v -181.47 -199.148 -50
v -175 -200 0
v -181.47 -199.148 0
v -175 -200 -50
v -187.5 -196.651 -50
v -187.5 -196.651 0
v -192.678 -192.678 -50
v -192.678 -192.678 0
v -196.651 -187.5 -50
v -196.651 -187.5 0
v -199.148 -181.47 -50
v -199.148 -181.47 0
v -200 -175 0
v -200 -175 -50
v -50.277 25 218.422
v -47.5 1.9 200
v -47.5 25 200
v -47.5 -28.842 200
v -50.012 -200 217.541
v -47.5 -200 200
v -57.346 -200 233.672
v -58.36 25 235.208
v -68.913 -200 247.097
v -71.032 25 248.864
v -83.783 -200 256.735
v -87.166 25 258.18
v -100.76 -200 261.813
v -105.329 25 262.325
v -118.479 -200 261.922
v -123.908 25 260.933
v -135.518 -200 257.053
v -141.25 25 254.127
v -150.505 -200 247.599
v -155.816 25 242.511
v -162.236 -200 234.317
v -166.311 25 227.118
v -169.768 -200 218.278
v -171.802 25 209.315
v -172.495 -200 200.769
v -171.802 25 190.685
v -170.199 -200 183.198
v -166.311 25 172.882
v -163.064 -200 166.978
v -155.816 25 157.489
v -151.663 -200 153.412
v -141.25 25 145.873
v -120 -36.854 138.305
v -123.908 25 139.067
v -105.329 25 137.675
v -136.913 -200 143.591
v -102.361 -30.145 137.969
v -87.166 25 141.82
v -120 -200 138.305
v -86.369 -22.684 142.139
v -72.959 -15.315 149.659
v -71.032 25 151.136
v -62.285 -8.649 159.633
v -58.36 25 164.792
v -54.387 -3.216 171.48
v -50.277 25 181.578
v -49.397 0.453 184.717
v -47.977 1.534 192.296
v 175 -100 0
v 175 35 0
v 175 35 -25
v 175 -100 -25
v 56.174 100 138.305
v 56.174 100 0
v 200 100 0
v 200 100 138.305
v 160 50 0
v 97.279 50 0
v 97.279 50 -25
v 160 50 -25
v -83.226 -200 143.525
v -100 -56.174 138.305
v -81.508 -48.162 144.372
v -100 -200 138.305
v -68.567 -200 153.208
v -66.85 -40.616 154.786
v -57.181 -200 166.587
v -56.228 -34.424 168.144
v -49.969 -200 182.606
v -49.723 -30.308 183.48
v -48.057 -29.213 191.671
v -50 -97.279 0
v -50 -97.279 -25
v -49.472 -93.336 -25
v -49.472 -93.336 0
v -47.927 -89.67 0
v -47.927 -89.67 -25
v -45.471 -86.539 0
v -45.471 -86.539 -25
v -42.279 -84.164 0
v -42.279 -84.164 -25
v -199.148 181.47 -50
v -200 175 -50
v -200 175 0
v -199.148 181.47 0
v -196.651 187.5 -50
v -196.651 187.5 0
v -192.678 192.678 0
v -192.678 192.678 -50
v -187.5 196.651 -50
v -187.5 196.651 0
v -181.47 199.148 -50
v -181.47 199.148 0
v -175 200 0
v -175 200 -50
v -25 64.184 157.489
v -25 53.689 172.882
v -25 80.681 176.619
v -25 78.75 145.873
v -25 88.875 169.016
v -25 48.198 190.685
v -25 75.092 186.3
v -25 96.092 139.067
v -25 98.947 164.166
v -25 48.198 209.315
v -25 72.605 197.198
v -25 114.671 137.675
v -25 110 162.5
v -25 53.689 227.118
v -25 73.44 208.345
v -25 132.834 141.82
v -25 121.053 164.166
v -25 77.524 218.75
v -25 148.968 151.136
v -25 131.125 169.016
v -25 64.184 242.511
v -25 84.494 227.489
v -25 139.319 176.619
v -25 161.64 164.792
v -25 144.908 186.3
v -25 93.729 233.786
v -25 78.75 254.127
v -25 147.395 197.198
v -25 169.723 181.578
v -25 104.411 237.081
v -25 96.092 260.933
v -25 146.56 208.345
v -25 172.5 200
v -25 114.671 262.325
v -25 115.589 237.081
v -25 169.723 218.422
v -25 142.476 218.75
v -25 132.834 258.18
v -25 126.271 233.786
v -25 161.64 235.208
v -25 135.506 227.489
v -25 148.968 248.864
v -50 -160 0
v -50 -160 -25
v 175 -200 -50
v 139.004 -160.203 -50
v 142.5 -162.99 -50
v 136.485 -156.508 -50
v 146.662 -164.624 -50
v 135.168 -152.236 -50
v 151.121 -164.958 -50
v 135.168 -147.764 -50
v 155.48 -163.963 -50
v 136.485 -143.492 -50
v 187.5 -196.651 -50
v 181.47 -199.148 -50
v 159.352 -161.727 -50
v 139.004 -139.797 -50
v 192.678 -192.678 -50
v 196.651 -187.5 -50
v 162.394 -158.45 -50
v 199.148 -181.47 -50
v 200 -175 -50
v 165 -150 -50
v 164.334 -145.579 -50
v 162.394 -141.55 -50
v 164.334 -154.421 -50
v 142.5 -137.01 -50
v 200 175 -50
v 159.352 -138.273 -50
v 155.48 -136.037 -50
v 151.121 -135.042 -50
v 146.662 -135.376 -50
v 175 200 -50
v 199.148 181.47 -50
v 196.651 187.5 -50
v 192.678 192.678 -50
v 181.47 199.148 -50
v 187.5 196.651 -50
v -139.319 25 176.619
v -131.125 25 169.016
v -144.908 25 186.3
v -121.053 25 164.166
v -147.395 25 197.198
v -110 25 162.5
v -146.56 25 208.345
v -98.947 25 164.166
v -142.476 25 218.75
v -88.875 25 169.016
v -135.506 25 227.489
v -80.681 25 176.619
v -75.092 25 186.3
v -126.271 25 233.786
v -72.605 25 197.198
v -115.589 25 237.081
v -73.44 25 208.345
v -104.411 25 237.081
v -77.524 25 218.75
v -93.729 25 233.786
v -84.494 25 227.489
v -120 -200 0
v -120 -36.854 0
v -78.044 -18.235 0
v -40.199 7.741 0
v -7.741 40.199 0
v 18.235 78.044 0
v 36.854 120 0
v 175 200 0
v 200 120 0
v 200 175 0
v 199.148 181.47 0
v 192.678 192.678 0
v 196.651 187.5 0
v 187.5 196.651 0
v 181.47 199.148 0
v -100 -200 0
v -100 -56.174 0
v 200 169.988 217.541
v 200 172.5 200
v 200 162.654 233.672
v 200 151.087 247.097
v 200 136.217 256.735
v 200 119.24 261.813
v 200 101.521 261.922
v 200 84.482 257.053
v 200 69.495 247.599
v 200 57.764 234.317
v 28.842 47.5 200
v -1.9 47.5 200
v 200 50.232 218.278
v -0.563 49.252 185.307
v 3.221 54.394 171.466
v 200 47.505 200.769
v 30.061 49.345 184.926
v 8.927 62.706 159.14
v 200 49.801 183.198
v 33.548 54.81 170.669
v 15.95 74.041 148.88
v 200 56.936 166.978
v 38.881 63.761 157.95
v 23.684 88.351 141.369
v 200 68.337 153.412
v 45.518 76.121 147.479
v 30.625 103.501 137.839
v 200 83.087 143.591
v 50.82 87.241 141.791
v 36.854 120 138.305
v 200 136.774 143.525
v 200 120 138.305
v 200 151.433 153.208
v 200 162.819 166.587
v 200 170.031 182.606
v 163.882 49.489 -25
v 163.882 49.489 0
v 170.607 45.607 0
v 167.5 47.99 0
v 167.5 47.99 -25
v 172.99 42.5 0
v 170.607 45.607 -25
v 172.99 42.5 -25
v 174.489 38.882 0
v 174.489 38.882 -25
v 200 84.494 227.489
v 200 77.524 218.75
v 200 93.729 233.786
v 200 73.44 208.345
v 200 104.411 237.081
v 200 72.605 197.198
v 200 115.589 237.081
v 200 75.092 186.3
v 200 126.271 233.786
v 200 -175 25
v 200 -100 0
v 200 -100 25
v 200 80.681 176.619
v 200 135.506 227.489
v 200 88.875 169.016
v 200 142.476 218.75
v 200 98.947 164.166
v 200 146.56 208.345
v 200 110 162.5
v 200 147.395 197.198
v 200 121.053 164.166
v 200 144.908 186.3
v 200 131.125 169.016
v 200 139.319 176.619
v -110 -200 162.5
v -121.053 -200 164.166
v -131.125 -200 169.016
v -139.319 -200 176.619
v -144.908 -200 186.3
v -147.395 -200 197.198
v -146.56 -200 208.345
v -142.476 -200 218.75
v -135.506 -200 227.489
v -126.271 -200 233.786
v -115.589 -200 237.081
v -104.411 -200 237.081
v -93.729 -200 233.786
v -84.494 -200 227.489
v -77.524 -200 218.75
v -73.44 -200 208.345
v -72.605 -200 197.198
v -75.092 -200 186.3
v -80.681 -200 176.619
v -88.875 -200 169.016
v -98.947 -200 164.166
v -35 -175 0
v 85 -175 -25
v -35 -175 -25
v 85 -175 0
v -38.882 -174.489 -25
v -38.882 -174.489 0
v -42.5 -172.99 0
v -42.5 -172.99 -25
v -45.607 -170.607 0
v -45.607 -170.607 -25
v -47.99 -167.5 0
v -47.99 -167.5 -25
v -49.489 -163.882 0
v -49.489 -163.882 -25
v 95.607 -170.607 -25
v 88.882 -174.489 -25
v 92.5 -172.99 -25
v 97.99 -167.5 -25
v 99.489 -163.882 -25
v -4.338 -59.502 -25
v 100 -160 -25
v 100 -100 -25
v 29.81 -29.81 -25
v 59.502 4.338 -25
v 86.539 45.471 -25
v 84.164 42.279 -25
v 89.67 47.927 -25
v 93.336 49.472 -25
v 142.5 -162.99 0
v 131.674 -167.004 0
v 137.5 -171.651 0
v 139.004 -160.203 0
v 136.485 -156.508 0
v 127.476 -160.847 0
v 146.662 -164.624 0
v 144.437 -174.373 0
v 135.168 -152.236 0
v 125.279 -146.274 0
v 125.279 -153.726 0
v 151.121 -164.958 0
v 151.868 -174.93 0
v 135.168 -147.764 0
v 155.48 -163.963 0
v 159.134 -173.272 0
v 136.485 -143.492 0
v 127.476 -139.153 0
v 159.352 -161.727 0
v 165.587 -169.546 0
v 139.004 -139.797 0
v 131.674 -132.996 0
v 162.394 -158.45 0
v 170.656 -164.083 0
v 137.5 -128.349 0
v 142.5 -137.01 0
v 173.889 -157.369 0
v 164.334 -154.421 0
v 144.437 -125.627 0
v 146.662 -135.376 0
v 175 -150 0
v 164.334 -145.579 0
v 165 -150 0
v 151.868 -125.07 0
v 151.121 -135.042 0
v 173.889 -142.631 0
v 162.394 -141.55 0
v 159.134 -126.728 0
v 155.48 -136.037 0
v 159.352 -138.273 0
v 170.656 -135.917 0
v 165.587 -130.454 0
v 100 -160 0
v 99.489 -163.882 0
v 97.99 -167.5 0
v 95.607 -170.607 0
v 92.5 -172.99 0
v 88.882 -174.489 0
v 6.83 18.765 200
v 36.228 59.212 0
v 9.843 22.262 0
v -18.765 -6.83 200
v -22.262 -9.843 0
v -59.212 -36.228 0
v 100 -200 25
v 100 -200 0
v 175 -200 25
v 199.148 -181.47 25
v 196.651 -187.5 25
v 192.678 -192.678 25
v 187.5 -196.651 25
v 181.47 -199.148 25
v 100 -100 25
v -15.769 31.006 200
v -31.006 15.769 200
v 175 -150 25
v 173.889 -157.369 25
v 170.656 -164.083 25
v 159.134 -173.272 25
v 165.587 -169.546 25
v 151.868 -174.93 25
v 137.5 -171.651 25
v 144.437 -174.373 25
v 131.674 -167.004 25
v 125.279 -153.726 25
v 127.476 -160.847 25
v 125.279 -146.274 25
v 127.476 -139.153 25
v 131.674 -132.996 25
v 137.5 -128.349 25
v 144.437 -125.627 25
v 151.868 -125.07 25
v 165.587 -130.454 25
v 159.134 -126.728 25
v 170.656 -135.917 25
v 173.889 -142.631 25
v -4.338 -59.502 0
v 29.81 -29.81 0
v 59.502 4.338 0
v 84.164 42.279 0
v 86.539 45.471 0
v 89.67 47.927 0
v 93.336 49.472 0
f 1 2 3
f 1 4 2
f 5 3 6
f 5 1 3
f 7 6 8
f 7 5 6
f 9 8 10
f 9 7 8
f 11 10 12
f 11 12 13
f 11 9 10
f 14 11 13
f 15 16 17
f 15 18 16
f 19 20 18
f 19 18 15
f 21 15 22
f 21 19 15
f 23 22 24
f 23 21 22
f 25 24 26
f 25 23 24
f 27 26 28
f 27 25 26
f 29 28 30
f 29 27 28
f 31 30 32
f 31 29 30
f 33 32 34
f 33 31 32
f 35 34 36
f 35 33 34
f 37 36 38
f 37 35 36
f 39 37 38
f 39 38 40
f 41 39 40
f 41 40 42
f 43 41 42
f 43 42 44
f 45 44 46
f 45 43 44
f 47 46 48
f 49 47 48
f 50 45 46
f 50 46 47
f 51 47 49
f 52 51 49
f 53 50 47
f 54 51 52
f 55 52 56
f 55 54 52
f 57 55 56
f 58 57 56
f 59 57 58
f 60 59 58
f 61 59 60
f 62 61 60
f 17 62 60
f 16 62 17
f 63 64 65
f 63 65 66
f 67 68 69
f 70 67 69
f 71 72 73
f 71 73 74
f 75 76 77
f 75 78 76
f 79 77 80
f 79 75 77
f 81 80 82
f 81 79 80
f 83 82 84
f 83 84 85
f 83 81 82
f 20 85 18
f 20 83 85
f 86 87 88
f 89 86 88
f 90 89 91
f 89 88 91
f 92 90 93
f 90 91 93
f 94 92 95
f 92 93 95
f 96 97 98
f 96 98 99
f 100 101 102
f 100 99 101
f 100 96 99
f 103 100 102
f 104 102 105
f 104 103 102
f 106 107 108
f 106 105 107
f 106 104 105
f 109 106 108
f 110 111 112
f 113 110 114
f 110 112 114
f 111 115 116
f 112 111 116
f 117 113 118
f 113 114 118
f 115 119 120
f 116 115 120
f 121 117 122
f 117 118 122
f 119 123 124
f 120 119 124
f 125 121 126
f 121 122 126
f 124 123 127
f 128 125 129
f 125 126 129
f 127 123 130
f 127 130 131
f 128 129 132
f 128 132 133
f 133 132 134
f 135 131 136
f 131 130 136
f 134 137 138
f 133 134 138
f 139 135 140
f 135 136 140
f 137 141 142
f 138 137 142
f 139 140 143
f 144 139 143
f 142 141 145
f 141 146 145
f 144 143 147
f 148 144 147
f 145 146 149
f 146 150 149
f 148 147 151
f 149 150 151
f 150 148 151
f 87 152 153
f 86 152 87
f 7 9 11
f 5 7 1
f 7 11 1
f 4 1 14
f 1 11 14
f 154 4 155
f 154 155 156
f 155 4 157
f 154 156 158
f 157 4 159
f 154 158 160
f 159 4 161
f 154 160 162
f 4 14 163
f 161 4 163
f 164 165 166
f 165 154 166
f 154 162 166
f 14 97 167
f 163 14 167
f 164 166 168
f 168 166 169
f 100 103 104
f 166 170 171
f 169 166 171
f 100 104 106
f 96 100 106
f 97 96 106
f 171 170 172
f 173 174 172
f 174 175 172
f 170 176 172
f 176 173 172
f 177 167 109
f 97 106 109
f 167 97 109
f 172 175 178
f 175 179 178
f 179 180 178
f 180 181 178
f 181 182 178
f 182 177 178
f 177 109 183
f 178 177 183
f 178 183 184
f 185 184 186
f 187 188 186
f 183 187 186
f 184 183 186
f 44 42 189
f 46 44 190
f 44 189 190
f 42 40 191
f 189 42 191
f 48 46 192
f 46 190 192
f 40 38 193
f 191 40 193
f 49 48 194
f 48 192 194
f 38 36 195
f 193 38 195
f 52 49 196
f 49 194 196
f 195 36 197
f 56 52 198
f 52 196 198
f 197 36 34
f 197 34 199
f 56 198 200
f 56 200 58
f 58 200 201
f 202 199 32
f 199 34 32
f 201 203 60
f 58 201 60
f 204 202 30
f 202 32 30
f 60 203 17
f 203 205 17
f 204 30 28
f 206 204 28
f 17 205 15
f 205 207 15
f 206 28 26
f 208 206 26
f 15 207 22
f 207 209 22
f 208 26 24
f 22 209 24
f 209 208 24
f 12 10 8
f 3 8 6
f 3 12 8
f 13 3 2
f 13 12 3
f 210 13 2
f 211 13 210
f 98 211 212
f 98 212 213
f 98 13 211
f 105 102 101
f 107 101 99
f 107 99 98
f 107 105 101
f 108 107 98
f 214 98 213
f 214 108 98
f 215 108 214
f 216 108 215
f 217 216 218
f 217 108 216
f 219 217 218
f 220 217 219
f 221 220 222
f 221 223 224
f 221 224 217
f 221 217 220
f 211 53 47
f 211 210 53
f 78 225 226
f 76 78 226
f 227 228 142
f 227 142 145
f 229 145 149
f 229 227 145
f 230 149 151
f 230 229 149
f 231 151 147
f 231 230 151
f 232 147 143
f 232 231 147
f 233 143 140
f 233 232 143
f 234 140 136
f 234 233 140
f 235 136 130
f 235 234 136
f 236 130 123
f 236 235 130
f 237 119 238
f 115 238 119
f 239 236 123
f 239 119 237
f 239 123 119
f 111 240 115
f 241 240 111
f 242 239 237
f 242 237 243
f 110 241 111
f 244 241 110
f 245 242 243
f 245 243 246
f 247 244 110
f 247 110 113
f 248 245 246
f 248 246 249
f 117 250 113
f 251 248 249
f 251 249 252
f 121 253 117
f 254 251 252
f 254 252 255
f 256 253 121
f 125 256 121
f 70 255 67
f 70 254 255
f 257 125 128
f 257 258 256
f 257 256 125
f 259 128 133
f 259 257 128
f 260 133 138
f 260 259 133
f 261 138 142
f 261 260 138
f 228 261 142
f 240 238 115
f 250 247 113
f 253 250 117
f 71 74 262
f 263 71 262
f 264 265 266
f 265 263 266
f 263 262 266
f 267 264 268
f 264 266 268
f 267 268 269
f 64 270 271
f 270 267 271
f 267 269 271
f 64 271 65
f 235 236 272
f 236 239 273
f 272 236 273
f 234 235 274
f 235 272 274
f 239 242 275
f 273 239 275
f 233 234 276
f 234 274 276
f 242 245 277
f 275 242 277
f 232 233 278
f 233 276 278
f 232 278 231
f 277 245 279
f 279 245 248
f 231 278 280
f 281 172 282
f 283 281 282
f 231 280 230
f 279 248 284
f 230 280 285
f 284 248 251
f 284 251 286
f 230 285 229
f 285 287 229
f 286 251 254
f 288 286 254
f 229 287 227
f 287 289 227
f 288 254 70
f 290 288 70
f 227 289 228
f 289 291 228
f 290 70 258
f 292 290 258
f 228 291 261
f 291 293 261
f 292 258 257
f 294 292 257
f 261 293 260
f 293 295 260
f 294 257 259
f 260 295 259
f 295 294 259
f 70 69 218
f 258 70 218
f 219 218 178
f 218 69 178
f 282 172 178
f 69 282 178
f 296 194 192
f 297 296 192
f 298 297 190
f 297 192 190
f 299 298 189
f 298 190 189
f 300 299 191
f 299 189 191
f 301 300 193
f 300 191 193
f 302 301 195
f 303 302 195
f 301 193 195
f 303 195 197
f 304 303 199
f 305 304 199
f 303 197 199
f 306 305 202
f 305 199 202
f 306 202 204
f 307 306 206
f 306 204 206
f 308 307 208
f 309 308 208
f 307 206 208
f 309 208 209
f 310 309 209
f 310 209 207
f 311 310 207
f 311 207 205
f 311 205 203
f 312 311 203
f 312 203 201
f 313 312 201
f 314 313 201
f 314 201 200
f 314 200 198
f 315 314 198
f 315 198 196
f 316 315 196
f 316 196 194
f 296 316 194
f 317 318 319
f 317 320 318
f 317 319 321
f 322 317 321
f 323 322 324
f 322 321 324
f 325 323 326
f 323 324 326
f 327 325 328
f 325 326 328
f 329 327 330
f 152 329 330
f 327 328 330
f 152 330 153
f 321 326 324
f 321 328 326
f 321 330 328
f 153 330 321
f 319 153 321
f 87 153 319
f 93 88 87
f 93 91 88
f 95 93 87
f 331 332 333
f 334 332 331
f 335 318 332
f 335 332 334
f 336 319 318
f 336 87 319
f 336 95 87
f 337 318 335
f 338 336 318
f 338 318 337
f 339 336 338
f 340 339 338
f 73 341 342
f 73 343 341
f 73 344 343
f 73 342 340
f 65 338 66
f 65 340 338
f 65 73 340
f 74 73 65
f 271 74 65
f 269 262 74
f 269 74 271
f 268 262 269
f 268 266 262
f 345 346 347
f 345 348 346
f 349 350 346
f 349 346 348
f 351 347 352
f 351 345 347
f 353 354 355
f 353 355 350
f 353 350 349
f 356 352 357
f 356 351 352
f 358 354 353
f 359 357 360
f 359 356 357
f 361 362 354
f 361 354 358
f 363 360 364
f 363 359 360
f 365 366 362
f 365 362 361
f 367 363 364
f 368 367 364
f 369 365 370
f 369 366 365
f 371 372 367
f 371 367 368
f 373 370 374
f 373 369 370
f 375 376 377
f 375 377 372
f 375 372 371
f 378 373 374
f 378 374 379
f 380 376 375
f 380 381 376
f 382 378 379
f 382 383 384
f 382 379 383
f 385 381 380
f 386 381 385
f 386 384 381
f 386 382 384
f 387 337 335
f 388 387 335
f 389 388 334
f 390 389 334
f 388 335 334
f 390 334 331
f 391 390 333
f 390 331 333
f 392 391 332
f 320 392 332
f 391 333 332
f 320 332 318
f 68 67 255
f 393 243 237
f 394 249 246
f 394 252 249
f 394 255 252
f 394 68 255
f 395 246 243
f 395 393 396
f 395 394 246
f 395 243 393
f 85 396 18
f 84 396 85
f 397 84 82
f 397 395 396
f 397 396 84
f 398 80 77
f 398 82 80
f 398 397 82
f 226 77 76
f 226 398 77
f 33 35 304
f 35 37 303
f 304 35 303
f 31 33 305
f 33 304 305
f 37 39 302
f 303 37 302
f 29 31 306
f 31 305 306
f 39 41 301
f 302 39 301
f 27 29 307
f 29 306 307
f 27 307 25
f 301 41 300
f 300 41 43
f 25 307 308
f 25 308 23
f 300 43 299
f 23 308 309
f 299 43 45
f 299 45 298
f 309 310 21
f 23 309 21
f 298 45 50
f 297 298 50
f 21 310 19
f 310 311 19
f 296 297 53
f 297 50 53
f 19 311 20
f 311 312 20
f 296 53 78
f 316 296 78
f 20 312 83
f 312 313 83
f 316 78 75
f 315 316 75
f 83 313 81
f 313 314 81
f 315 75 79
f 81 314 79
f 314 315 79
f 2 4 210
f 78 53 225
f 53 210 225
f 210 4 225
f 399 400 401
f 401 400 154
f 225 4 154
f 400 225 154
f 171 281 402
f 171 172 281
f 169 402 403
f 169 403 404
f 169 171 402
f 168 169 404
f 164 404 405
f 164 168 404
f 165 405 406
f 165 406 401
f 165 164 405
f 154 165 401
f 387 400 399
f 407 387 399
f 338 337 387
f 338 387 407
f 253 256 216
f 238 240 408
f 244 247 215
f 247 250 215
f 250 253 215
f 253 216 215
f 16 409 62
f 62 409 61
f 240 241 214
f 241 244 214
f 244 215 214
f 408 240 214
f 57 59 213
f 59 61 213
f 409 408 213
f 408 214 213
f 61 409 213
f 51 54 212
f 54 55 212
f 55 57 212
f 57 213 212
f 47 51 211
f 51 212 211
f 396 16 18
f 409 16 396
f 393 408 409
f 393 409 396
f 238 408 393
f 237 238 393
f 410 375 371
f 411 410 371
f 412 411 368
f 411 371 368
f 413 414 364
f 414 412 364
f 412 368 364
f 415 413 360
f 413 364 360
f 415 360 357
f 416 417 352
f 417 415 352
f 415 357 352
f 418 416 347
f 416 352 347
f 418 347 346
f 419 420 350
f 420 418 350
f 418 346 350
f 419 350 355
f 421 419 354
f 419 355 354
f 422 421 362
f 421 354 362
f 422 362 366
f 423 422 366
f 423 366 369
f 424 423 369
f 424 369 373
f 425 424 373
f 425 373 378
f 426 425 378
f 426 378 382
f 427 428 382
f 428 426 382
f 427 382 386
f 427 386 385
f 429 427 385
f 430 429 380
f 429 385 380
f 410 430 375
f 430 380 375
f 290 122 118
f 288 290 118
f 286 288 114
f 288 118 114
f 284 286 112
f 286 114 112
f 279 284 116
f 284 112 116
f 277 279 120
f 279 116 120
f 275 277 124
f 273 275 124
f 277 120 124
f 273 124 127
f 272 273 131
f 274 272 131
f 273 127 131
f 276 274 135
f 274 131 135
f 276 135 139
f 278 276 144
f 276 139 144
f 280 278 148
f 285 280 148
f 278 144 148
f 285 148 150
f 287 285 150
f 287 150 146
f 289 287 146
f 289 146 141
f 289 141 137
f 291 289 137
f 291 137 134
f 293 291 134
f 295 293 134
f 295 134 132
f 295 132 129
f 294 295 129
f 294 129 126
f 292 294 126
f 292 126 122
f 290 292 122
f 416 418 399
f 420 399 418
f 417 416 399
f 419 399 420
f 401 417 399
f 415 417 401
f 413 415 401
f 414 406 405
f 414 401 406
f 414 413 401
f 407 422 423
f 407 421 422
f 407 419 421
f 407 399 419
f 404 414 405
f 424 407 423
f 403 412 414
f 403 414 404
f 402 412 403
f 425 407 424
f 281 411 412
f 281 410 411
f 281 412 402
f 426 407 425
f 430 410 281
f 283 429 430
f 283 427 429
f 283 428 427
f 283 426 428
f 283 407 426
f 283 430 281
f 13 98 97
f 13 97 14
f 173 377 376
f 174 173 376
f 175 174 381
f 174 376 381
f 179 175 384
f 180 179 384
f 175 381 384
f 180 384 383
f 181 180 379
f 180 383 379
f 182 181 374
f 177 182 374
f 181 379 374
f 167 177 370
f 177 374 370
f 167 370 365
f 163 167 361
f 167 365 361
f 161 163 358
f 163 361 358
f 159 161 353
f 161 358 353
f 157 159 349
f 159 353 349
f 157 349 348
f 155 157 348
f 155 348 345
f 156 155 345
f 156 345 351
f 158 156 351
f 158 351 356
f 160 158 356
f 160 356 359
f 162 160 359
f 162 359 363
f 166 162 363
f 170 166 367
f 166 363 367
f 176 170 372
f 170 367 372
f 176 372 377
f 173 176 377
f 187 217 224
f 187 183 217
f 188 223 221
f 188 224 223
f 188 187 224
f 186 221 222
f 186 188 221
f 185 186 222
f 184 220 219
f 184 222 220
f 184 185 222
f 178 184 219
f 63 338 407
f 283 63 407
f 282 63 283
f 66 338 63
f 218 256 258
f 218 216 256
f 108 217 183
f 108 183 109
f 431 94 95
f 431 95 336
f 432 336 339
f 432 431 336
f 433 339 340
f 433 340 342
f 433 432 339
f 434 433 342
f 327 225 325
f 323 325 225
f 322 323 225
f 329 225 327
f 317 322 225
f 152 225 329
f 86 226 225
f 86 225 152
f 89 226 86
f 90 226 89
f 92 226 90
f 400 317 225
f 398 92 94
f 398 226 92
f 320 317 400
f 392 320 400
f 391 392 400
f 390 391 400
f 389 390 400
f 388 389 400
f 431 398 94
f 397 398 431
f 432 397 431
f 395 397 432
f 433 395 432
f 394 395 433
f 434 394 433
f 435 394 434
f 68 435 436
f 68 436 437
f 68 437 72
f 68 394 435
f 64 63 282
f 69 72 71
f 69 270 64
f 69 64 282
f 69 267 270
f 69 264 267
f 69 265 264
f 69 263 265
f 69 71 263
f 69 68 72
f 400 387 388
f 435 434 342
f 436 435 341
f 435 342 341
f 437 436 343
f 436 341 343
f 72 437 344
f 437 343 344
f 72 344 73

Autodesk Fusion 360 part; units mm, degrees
sketch "Sketch1" plane through (0, 0, 0) normal (0, 0, 1) x (1, 0, 0)
  line L0 (200, 200) -> (-200, 200)
  line L1 (-200, 200) -> (-200, -200)
  line L2 (-200, -200) -> (200, -200)
  line L3 (200, -200) -> (200, 200)
  line L4 (200, 200) -> (-200, -200) construction
  line L5 (200, -200) -> (100, -200)
  line L6 (100, -200) -> (100, -100)
  line L7 (100, -100) -> (200, -100)
  line L8 (200, -100) -> (200, -200)
  line L9 (-120, -200) -> (-120, -36.8544)
  line L10 (36.8544, 120) -> (200, 120)
  line L11 (-100, -200) -> (-100, -56.1738)
  line L12 (56.1738, 100) -> (200, 100)
  line L13 (-200, 200) -> (-100, 100) construction
  line L14 (-23.2233, 23.2233) -> (200, -200) construction
  arc A0 (-120, -36.8544) -> (36.8544, 120) centre (-200, 200) ccw
  arc A1 (-100, -56.1738) -> (56.1738, 100) centre (-200, 200) ccw
  line L15 (175, 100) -> (175, -100)
  line L16 (100, -175) -> (-100, -175)
  line L17 (-50, -175) -> (-50, -88.3141)
  arc A2 (-50, -88.3141) -> (88.3141, 50) centre (-200, 200) ccw
  line L18 (88.3141, 50) -> (175, 50)
  circle A3 centre (150, -150) radius 25
  circle A4 centre (150, -150) radius 15
  dimension "d1" = 400
  dimension "d2" = 400
  dimension "d3" = 100
  dimension "d4" = 100
  dimension "d5" = 500
  dimension "d6" = 550
  dimension "d7" = 80
  dimension "d8" = 80
  dimension "d10" = 25
  dimension "d11" = 25
  dimension "d13" = 50
  dimension "d14" = 30
  dimension "d15" = 50
extrude "Extrude1" add sketch "Sketch1" against normal blind 50 contours L0 L1 L2 L3 L9 L10 A0 | L2 L3 L9 L10 L11 L12 A0 A1 | L3 L7 L12 L15 | L2 L3 L5 L6 L7 L8 | L11 L12 A1 L15 L16 L17 A2 L18 | L2 L6 L11 L16 | L6 L7 L15 L16 L17 A2 L18 | A3 | A4
extrude "Extrude2" cut sketch "Sketch1" against normal blind 25 contours L6 L7 L15 L16 L17 A2 L18
extrude "Extrude3" cut sketch "Sketch1" against normal blind 110 contours A4
extrude "Extrude4" add sketch "Sketch1" along normal blind 25 contours L2 L3 L5 L6 L7 L8
extrude "Extrude5" add sketch "Sketch1" along normal blind 200 contours L2 L3 L9 L10 L11 L12 A0 A1
fillet "Fillet1" radius 25 4 edges at (-200, 200, -25) (200, 200, -25) (-200, -200, -25) (200, -200, -12.5)
fillet "Fillet2" radius 15 5 edges at (88.3141, 50, -12.5) (-50, -88.3141, -12.5) (-50, -175, -12.5) (100, -175, -12.5) (175, 50, -12.5)
sketch "Sketch2" plane through (0, -200, 0) normal (0, -1, 0) x (1, 0, 0)
  line L0 (175, -50) -> (175, 25)
  line L1 (175, 25) -> (100, 25)
  line L2 (100, 25) -> (100, 0)
  line L3 (100, 0) -> (-100, 0)
  line L4 (-100, 0) -> (-100, 200)
  line L5 (-100, 200) -> (-120, 200)
  line L6 (-120, 200) -> (-120, 0)
  line L7 (-120, 0) -> (-175, 0)
  line L8 (-175, 0) -> (-175, -50)
  line L9 (-175, -50) -> (175, -50)
  circle A0 centre (-110, 200) radius 62.5
  dimension "d30" = 125
extrude "Extrude6" add sketch "Sketch2" against normal blind 225 contours L4 L5 L6 A0 | L4 L5 L6 A0
sketch "Sketch3" plane through (200, 0, 0) normal (1, 0, 0) x (0, 1, 0)
  line L0 (-175, 25) -> (-175, -50)
  line L1 (-175, -50) -> (175, -50)
  line L2 (175, -50) -> (175, 0)
  line L3 (175, 0) -> (120, 0)
  line L4 (120, 0) -> (120, 200)
  line L5 (120, 200) -> (100, 200)
  line L6 (100, 200) -> (100, 0)
  line L7 (100, 0) -> (-100, 0)
  line L8 (-100, 0) -> (-100, 25)
  line L9 (-100, 25) -> (-175, 25)
  circle A0 centre (110, 200) radius 62.5
  dimension "d33" = 125
extrude "Extrude7" add sketch "Sketch3" against normal blind 225 contours L4 L5 L6 A0 | L4 L5 L6 A0
hole "Hole1" at (-110, -200, 200) direction (0, 1, 0) diameter 75 end through all
hole "Hole2" at (200, 110, 200) direction (-1, 0, 0) diameter 75 end through all
